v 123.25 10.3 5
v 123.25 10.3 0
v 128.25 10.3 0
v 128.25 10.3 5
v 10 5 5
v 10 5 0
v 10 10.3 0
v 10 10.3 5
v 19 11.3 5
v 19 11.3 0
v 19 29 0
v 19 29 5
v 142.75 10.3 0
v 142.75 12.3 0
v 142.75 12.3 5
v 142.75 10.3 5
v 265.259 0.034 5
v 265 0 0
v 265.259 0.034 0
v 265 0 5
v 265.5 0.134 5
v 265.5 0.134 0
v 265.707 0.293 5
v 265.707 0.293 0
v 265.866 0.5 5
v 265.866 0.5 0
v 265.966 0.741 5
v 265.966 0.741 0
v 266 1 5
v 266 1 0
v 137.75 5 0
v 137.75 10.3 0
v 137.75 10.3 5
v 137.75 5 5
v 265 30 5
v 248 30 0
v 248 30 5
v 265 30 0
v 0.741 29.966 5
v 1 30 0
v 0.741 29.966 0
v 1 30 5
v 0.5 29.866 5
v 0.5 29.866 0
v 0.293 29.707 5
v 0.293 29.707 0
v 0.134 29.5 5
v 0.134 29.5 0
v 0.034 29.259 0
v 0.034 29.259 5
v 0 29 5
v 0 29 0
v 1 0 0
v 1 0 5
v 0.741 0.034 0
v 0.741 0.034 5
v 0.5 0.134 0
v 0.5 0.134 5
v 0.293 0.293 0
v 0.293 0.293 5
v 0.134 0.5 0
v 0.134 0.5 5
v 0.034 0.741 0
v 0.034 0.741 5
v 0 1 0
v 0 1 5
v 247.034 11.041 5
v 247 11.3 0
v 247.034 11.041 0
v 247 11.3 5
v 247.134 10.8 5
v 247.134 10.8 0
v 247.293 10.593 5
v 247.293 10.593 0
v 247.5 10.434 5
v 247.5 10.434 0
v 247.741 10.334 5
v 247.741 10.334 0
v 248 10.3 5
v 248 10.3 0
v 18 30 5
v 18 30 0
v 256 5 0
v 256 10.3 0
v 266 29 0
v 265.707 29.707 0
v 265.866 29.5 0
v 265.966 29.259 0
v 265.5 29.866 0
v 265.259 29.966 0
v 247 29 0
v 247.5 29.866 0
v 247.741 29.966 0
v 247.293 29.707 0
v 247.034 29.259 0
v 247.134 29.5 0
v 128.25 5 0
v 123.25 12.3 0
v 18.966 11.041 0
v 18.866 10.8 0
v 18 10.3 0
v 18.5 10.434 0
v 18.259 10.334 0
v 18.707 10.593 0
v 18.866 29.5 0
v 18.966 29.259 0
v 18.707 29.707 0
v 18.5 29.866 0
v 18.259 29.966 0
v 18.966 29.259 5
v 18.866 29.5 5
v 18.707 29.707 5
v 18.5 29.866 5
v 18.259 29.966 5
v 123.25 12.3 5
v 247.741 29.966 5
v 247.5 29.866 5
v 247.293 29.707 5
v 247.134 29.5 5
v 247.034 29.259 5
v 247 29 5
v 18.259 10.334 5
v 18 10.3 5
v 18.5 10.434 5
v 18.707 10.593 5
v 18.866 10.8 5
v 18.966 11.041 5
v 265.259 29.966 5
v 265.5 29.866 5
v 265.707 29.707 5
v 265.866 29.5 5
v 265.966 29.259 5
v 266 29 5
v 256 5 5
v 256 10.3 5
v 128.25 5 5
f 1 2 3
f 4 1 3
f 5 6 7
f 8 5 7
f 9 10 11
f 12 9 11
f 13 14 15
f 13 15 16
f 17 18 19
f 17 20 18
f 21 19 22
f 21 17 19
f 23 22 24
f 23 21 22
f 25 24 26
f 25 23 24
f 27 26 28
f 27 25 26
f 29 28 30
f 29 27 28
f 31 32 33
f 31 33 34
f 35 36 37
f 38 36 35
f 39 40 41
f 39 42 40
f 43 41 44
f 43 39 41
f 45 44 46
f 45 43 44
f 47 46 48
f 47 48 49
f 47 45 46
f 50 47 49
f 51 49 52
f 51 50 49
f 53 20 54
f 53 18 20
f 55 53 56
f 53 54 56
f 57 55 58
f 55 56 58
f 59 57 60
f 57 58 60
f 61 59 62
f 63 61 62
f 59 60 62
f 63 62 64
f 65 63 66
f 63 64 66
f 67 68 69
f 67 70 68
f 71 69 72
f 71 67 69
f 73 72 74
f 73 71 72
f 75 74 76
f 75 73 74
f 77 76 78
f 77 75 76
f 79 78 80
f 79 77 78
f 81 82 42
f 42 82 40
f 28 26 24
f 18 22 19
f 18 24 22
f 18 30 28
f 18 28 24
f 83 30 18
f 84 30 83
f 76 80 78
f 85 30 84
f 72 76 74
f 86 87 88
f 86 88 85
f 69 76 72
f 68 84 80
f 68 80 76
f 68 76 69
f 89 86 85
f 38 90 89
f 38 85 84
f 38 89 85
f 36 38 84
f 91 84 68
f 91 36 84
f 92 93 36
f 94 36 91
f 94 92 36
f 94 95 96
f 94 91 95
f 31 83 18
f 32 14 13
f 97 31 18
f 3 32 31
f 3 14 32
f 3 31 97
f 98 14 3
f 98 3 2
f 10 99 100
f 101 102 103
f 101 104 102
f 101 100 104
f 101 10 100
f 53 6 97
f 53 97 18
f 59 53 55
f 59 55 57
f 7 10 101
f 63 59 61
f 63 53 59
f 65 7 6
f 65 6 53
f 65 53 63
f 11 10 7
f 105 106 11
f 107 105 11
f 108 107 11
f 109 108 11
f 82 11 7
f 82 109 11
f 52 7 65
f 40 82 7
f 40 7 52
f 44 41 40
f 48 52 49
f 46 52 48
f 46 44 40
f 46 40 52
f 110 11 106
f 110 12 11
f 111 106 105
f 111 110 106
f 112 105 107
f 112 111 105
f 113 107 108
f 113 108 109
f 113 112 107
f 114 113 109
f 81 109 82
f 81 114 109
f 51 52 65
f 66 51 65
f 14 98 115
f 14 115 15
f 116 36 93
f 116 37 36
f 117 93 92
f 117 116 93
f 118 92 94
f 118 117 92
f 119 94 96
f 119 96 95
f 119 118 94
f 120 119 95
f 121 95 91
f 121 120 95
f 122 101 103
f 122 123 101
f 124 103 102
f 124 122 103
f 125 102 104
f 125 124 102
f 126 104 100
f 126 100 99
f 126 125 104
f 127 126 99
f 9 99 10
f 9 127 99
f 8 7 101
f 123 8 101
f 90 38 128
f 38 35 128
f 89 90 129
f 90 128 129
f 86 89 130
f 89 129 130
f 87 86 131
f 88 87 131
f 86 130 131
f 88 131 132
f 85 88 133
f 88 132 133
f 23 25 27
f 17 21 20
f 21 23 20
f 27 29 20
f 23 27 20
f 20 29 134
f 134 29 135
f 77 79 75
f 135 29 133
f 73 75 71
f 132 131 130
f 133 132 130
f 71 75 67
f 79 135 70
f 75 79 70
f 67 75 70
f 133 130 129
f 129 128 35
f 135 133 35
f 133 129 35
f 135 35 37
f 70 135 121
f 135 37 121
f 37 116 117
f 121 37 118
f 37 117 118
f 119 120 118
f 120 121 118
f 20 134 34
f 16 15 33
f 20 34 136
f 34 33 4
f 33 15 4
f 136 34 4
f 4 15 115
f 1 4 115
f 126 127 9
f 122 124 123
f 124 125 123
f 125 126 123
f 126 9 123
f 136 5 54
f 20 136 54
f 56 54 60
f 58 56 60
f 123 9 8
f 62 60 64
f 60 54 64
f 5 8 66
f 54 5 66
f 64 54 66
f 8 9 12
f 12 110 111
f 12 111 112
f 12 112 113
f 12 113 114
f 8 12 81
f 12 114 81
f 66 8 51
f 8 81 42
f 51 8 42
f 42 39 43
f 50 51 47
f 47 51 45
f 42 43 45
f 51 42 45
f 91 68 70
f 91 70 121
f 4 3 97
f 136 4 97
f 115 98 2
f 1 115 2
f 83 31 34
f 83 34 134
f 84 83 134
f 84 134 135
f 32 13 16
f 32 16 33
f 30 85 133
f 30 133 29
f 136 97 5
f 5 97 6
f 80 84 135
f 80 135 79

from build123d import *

# Parameters (mm, degrees)
BOSS_EXTRUDE1_DEPTH = 5
FILLET1_R           = 1


with BuildPart() as part:
    # Sketch1 → Boss-Extrude1 (new body)
    with BuildSketch(Plane.XY):
        Polygon((0, 0), (133, 0), (133, 12.3), (123.25, 12.3), (123.25, 10.3), (128.25, 10.3), (128.25, 5), (10, 5), (10, 10.3), (19, 10.3), (19, 30), (0, 30), align=None)
    extrude(amount=BOSS_EXTRUDE1_DEPTH)

    # Mirror1: part across plane


with BuildPart() as part_1:
    add(part.part)
    add(part.part.mirror(Plane(origin=(133, 12.3, 5), x_dir=(0, 0, 1), z_dir=(-1, 0, 0))))

    # Fillet1
    fillet1_edges = [part_1.edges().sort_by_distance(p)[0] for p in [
        (0, 30, 2.5),
        (19, 30, 2.5),
        (19, 10.3, 2.5),
        (0, 0, 2.5),
        (266, 0, 2.5),
        (247, 10.3, 2.5),
        (247, 30, 2.5),
        (266, 30, 2.5),
    ]]
    fillet(fillet1_edges, radius=FILLET1_R)


solid = part_1.part
